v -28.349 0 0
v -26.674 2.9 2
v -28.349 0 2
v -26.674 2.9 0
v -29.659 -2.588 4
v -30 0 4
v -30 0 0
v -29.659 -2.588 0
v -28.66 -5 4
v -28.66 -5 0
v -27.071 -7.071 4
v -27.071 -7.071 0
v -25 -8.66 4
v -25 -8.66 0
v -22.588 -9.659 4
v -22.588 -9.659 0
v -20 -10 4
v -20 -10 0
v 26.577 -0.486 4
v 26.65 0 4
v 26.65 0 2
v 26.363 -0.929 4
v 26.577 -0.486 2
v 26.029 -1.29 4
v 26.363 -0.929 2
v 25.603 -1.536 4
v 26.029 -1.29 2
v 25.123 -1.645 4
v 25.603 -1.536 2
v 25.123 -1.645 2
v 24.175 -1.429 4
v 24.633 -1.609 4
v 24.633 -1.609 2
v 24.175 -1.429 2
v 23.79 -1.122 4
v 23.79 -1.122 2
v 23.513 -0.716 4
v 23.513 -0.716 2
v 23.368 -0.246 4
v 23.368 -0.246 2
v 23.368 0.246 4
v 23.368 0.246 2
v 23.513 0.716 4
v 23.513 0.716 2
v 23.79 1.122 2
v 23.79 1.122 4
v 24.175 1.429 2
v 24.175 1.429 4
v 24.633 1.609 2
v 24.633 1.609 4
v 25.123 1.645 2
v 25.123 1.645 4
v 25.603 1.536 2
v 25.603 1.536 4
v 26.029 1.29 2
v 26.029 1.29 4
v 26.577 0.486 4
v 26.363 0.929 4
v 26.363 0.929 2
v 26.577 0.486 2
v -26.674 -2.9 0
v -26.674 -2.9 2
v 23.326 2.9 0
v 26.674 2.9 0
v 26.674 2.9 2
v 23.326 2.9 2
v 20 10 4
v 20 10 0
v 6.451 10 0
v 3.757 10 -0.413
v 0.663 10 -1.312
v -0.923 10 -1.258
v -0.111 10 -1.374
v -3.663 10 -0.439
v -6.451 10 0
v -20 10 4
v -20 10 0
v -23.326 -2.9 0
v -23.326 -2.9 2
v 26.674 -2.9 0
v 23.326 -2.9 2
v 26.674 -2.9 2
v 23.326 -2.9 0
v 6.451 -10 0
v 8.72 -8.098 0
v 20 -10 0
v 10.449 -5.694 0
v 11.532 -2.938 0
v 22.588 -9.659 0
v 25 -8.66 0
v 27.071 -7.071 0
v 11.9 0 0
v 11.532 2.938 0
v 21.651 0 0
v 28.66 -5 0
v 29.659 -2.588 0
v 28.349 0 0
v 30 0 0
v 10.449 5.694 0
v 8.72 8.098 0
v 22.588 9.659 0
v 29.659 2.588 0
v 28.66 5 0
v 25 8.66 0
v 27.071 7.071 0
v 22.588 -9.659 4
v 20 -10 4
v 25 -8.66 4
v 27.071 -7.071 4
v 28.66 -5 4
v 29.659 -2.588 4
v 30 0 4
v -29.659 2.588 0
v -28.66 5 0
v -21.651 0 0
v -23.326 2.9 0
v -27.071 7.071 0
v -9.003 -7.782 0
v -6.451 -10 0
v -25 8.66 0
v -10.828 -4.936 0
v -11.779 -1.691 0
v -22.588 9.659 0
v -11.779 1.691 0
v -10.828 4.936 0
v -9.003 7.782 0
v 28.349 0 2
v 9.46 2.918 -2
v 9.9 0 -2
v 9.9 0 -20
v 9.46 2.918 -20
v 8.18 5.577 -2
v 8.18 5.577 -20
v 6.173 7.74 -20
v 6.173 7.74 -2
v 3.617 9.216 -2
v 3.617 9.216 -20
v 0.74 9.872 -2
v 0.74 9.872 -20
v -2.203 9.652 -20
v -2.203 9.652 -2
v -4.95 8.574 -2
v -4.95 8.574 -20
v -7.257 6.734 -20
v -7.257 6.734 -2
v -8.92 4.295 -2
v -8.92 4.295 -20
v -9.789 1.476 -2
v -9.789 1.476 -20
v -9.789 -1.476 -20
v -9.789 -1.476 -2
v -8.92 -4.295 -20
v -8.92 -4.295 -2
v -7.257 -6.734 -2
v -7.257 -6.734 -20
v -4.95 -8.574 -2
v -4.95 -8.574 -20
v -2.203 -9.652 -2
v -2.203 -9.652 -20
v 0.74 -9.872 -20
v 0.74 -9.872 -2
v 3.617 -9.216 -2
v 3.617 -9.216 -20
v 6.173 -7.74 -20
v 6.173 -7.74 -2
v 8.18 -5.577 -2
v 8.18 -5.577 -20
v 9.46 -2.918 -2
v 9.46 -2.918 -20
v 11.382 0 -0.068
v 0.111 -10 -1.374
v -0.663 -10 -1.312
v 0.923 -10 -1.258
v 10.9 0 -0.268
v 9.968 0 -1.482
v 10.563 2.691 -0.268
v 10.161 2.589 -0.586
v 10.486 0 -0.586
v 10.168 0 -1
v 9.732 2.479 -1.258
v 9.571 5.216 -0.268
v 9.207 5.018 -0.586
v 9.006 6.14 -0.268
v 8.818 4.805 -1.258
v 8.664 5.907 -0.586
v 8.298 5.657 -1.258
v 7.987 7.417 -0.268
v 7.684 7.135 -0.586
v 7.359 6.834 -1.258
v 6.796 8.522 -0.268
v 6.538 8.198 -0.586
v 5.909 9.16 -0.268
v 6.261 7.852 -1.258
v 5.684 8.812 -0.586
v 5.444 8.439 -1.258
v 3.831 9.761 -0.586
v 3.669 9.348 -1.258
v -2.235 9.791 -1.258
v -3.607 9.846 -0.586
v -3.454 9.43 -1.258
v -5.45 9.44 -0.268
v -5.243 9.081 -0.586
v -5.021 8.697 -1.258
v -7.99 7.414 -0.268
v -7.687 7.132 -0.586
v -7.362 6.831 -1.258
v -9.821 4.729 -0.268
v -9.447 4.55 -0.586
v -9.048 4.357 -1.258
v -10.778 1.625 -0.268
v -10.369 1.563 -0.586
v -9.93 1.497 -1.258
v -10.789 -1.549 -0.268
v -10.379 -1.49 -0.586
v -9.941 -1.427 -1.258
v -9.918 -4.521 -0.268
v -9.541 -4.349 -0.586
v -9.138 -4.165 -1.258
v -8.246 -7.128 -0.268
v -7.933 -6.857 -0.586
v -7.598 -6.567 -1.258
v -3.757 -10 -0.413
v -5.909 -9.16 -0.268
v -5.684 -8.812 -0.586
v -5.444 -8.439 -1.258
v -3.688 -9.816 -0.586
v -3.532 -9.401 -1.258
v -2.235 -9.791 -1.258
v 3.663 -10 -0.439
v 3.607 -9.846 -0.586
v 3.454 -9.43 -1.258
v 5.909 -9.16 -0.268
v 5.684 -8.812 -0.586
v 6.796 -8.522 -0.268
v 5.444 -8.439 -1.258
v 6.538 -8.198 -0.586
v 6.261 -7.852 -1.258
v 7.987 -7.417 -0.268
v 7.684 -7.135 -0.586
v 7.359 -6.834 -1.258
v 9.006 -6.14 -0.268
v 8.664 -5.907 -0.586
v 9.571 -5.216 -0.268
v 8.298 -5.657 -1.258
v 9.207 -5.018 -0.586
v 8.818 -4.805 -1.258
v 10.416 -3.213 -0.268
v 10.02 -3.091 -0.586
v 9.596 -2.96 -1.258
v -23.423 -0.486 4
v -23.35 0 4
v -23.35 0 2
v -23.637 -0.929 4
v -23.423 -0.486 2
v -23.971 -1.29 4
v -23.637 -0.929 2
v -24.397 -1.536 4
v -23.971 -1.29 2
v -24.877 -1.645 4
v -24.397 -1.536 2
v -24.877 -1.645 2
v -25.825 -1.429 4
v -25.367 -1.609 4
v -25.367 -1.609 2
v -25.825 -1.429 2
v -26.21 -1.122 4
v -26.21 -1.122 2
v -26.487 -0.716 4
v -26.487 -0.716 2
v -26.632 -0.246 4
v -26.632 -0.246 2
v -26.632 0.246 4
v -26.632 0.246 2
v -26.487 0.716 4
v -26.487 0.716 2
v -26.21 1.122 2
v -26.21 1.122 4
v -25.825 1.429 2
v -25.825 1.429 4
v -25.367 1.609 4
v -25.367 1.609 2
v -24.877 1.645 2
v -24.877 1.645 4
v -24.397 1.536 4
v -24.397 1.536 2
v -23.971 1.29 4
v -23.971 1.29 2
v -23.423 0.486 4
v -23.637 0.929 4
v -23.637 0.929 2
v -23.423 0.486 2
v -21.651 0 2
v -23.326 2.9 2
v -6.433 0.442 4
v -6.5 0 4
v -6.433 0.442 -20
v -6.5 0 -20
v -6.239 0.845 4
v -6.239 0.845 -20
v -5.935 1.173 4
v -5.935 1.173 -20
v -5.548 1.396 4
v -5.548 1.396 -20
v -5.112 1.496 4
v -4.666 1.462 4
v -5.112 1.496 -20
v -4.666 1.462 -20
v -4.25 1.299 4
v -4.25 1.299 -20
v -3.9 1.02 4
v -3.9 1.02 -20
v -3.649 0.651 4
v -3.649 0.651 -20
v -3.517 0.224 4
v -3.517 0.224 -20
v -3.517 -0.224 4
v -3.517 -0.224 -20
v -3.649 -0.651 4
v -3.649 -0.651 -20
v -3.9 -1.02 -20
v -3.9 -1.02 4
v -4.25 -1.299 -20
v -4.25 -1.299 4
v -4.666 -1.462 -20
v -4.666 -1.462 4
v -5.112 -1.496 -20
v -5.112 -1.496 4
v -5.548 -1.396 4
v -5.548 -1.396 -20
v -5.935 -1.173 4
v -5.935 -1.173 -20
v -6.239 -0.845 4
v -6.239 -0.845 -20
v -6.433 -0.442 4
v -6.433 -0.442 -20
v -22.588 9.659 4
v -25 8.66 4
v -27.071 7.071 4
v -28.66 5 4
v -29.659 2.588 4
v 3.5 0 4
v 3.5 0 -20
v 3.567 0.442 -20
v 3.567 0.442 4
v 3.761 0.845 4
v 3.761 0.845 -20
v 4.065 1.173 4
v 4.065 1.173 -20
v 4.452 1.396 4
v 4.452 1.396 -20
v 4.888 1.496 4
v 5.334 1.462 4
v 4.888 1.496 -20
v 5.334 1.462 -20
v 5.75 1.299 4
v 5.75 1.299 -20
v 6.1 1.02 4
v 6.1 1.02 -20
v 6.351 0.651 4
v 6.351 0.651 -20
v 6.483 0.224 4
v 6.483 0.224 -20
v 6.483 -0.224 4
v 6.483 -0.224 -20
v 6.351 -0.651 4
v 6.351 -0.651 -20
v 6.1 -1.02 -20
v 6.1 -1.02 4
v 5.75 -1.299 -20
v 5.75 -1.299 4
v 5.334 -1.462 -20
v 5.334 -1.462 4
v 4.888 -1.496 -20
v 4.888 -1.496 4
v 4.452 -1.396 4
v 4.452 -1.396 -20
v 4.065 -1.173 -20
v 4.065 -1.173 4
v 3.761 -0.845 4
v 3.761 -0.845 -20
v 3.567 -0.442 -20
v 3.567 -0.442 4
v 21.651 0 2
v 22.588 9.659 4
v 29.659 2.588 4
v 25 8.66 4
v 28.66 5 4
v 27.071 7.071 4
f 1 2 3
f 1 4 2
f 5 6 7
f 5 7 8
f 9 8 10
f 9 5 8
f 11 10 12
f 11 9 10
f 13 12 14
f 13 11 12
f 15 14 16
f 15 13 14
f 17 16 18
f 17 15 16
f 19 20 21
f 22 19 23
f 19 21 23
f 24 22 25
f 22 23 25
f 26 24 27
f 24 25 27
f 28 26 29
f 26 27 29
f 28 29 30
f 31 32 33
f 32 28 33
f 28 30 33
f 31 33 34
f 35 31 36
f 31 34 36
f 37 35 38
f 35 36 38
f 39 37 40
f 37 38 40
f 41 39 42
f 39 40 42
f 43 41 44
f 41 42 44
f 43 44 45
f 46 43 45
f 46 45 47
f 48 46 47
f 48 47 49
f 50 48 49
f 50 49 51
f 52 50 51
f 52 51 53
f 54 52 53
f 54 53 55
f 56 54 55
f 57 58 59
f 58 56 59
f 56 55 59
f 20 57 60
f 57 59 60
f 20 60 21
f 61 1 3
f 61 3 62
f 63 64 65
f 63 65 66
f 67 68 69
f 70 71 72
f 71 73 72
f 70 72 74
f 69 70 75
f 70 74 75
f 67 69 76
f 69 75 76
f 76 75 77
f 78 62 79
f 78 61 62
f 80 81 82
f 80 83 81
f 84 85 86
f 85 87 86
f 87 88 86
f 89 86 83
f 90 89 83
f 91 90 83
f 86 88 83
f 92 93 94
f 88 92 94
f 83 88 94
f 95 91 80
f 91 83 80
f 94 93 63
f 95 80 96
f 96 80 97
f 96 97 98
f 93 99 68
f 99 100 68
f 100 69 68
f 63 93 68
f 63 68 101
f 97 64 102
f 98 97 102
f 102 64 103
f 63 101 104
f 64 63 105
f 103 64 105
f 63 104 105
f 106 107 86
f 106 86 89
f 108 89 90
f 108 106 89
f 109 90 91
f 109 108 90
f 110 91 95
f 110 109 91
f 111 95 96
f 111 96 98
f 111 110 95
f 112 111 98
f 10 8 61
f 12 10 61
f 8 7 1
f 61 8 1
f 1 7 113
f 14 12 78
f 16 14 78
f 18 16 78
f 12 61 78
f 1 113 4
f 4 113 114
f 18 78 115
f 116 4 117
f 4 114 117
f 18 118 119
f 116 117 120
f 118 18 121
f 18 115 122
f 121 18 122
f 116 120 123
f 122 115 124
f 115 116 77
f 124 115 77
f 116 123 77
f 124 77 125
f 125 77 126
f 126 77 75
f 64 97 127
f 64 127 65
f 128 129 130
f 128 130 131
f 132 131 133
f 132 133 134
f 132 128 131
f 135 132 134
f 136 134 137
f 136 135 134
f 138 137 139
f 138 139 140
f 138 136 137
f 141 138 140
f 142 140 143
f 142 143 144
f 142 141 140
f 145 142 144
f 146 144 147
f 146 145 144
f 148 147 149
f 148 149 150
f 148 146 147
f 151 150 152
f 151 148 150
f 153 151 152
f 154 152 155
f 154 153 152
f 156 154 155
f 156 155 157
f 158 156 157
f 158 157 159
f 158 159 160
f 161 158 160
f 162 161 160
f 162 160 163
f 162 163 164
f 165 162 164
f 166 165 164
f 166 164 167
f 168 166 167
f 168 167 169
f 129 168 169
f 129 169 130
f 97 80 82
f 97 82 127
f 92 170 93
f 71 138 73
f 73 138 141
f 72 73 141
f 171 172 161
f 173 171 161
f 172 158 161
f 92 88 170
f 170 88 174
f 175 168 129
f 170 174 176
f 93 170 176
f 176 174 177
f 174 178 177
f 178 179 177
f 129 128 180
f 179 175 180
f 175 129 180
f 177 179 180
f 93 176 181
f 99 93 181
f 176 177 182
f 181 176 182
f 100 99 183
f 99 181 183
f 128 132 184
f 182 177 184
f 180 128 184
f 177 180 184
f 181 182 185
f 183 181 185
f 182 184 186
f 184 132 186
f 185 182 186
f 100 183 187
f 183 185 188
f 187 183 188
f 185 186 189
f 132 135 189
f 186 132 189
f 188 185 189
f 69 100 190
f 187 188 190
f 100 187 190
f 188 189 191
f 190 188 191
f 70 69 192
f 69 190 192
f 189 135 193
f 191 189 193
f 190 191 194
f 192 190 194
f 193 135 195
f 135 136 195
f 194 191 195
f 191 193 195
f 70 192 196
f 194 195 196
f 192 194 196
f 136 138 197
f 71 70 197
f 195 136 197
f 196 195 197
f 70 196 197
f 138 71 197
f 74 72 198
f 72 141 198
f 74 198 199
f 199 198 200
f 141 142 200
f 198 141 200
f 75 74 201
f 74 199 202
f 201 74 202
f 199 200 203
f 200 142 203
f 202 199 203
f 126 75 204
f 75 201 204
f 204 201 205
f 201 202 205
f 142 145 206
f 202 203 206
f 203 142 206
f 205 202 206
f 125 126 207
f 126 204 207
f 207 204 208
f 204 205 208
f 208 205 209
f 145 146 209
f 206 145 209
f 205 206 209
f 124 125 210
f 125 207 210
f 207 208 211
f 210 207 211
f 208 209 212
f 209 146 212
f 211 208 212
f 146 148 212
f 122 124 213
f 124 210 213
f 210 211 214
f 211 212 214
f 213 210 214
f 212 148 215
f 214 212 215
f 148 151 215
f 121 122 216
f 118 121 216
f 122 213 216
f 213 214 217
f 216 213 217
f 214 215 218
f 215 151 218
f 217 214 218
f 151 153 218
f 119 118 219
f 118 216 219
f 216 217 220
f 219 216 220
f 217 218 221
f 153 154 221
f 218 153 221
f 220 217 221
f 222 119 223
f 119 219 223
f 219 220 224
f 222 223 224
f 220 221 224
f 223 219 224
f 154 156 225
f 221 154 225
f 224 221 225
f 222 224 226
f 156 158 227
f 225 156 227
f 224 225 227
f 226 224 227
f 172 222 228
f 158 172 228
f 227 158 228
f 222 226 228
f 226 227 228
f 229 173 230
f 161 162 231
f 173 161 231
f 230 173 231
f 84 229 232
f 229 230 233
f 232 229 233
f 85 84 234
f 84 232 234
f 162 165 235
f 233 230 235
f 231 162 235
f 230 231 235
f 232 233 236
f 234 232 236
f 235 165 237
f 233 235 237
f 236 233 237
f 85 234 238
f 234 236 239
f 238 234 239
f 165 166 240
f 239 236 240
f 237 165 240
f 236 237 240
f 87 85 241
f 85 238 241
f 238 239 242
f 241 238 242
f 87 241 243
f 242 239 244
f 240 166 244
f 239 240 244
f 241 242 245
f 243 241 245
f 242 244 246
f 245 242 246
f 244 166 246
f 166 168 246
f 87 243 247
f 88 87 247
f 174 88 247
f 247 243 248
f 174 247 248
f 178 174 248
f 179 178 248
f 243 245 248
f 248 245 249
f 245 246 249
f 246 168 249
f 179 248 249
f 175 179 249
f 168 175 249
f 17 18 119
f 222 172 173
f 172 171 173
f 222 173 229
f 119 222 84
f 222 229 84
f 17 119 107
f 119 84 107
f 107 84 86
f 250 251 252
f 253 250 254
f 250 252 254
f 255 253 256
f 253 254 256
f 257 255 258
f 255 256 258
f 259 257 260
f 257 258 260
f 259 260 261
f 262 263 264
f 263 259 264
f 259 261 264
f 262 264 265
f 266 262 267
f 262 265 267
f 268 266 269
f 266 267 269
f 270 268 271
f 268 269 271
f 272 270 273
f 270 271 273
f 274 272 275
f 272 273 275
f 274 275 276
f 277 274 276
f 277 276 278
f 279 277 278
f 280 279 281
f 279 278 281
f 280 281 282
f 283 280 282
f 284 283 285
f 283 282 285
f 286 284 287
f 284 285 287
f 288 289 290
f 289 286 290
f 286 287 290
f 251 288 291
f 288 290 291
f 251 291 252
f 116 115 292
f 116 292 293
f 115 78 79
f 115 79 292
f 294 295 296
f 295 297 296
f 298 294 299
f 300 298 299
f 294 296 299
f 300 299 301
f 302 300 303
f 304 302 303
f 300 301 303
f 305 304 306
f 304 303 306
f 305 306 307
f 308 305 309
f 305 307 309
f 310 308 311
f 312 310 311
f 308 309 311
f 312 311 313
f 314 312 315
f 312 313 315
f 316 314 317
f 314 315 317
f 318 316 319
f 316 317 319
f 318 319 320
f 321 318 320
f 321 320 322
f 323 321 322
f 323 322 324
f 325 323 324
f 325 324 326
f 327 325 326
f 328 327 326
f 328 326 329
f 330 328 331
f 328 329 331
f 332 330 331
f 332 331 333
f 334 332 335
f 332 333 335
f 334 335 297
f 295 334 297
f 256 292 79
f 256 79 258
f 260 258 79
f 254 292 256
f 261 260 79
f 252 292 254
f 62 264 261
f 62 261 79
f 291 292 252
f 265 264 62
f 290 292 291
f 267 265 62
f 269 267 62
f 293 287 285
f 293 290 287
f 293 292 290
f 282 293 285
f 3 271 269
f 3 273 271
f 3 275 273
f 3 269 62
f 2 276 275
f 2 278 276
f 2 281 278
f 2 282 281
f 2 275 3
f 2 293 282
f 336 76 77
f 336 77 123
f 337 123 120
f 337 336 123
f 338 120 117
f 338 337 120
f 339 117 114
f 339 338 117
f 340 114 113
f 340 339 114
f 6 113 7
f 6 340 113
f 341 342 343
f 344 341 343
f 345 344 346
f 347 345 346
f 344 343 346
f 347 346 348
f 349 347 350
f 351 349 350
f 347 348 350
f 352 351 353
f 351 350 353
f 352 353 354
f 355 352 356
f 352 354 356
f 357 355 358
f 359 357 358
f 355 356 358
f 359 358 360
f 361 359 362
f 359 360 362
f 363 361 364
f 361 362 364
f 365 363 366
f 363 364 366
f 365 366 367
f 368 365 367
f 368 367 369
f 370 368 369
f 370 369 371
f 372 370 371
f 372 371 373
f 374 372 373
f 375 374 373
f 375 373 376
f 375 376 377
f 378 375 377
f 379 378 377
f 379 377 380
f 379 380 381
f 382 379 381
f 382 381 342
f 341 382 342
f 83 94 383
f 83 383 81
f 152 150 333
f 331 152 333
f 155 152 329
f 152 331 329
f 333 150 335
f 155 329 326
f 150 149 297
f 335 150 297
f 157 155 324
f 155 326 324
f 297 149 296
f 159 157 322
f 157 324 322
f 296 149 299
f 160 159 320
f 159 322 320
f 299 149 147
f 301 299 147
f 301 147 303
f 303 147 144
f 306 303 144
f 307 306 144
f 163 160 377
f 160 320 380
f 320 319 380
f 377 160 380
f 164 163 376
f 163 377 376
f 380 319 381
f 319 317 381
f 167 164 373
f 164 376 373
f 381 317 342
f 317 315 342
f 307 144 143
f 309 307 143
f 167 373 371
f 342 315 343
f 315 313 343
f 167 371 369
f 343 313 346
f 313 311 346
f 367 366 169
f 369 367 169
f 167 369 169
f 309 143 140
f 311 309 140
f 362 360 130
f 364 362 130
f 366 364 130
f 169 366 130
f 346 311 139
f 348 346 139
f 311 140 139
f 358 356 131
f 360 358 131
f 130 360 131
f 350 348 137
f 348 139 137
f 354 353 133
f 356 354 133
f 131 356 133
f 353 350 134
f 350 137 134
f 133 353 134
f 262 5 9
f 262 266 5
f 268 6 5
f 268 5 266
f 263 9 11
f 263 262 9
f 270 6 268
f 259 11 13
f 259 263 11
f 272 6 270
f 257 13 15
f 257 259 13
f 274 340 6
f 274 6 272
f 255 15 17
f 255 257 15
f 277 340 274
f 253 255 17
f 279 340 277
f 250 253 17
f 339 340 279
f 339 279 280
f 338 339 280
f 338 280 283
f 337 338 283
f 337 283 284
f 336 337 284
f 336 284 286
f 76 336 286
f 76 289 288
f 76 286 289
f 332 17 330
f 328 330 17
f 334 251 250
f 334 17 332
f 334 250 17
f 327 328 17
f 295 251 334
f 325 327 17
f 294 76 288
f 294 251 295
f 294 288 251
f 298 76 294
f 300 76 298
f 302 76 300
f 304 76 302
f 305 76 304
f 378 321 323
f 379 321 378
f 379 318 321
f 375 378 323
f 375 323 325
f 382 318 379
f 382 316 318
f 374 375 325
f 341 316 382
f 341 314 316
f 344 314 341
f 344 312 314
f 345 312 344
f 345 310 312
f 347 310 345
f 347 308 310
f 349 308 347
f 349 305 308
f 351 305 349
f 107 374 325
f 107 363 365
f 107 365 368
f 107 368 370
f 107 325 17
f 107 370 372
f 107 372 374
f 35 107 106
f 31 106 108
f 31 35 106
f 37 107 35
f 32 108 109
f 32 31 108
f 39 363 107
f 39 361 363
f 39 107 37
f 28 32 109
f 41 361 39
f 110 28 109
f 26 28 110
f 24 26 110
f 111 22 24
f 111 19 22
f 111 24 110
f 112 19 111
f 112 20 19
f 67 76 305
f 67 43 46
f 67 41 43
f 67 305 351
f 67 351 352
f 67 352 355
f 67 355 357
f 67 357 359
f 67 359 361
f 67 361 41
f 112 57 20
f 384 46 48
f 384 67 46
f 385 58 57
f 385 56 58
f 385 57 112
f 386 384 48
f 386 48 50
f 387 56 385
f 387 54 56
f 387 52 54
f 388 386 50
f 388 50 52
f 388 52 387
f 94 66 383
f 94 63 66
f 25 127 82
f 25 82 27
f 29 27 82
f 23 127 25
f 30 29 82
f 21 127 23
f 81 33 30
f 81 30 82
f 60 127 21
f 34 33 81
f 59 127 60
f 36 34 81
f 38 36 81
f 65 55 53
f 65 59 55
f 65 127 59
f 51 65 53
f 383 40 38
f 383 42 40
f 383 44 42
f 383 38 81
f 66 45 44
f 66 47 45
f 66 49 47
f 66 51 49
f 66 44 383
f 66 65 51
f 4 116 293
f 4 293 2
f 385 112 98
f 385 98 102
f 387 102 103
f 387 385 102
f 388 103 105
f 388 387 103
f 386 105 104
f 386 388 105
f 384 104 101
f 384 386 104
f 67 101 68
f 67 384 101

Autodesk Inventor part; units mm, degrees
ref_plane "YZ Plane" through (0, 0, 0) normal (1, 0, 0) x (0, 1, 0)
ref_plane "XZ Plane" through (0, 0, 0) normal (0, 1, 0) x (-1, 0, 0)
ref_plane "XY Plane" through (0, 0, 0) normal (0, 0, 1) x (1, 0, 0)
sketch "Sketch1" plane through (0, 0, 0) normal (0, 0, 1) x (1, 0, 0)
  line L0 (-30, -10) -> (30, -10)
  line L1 (30, -10) -> (30, 10)
  line L2 (30, 10) -> (-30, 10)
  line L3 (-30, 10) -> (-30, -10)
  line L4 (-30, -10) -> (30, 10) construction
  line L5 (30, -10) -> (-30, 10) construction
  circle A0 centre (0, 0) radius 9.9
  circle A1 centre (-25, 0) radius 1.65
  circle A2 centre (25, 0) radius 1.65
  line L6 (-25, 0) -> (25, 0) construction
  point P0 (-30, 0)
  dimension "d0" = 60
  dimension "d1" = 19.8
  dimension "d2" = 20
  dimension "d3" = 50
  dimension "d4" = 3.3
extrude "Extrusion1" add sketch "Sketch1" along normal blind 4 contours L3 L2 L1 L0 | A0
extrude "Extrusion2" add sketch "Sketch1" against normal blind 20 contours A0
fillet "Fillet1" radius 2 1 edges at (-9.9, 0, 0)
fillet "Fillet2" radius 10 4 edges at (30, 10, 2) (30, -10, 2) (-30, 10, 2) (-30, -10, 2)
sketch "Sketch2" plane through (0, 0, 0) normal (0, 0, -1) x (-1, 0, 0)
  arc A0 (-20, 10) -> (-20, -10) centre (-20, 0) ccw projected
  line L0 (-6.4506, -10) -> (-20, -10) projected
  arc A1 (-6.4506, 10) -> (-6.4506, -10) centre (0, 0) ccw projected
  line L1 (-20, 10) -> (-6.4506, 10) projected
  circle A2 centre (-25, 0) radius 1.65 projected
  line L2 (25, 0) -> (-25, 0) construction
  line L3 (-23.3257, -2.9) -> (-26.6743, -2.9)
  line L4 (-26.6743, -2.9) -> (-28.3486, 0)
  line L5 (-28.3486, 0) -> (-26.6743, 2.9)
  line L6 (-26.6743, 2.9) -> (-23.3257, 2.9)
  line L7 (-23.3257, 2.9) -> (-21.6514, 0)
  line L8 (-21.6514, 0) -> (-23.3257, -2.9)
  circle A3 centre (25, 0) radius 1.65 projected
  line L9 (23.3257, 2.9) -> (26.6743, 2.9)
  line L10 (26.6743, 2.9) -> (28.3486, 0)
  line L11 (28.3486, 0) -> (26.6743, -2.9)
  line L12 (26.6743, -2.9) -> (23.3257, -2.9)
  line L13 (23.3257, -2.9) -> (21.6514, 0)
  line L14 (21.6514, 0) -> (23.3257, 2.9)
  point P0 (25, 2.9)
  dimension "d11" = 5.8
  dimension "d12" = 5.8
extrude "Extrusion3" cut sketch "Sketch2" against normal blind 2 contours L3 L4 L5 L6 L7 L8 | L9 L10 L11 L12 L13 L14
sketch "Sketch3" plane through (0, 0, -20) normal (0, 0, -1) x (-1, 0, 0)
  circle A0 centre (0, 0) radius 9.9 projected
  circle A1 centre (-5, 0) radius 1.5
  line L0 (0, 0) -> (0, 2.4769)
  circle A2 centre (5, 0) radius 1.5
  dimension "d15" = 3
  dimension "d16" = 10
extrude "Extrusion4" cut sketch "Sketch3" against normal through all contours A1 | A2
properties part number "GIRO_1" material "Steel, Mild, Welded"
